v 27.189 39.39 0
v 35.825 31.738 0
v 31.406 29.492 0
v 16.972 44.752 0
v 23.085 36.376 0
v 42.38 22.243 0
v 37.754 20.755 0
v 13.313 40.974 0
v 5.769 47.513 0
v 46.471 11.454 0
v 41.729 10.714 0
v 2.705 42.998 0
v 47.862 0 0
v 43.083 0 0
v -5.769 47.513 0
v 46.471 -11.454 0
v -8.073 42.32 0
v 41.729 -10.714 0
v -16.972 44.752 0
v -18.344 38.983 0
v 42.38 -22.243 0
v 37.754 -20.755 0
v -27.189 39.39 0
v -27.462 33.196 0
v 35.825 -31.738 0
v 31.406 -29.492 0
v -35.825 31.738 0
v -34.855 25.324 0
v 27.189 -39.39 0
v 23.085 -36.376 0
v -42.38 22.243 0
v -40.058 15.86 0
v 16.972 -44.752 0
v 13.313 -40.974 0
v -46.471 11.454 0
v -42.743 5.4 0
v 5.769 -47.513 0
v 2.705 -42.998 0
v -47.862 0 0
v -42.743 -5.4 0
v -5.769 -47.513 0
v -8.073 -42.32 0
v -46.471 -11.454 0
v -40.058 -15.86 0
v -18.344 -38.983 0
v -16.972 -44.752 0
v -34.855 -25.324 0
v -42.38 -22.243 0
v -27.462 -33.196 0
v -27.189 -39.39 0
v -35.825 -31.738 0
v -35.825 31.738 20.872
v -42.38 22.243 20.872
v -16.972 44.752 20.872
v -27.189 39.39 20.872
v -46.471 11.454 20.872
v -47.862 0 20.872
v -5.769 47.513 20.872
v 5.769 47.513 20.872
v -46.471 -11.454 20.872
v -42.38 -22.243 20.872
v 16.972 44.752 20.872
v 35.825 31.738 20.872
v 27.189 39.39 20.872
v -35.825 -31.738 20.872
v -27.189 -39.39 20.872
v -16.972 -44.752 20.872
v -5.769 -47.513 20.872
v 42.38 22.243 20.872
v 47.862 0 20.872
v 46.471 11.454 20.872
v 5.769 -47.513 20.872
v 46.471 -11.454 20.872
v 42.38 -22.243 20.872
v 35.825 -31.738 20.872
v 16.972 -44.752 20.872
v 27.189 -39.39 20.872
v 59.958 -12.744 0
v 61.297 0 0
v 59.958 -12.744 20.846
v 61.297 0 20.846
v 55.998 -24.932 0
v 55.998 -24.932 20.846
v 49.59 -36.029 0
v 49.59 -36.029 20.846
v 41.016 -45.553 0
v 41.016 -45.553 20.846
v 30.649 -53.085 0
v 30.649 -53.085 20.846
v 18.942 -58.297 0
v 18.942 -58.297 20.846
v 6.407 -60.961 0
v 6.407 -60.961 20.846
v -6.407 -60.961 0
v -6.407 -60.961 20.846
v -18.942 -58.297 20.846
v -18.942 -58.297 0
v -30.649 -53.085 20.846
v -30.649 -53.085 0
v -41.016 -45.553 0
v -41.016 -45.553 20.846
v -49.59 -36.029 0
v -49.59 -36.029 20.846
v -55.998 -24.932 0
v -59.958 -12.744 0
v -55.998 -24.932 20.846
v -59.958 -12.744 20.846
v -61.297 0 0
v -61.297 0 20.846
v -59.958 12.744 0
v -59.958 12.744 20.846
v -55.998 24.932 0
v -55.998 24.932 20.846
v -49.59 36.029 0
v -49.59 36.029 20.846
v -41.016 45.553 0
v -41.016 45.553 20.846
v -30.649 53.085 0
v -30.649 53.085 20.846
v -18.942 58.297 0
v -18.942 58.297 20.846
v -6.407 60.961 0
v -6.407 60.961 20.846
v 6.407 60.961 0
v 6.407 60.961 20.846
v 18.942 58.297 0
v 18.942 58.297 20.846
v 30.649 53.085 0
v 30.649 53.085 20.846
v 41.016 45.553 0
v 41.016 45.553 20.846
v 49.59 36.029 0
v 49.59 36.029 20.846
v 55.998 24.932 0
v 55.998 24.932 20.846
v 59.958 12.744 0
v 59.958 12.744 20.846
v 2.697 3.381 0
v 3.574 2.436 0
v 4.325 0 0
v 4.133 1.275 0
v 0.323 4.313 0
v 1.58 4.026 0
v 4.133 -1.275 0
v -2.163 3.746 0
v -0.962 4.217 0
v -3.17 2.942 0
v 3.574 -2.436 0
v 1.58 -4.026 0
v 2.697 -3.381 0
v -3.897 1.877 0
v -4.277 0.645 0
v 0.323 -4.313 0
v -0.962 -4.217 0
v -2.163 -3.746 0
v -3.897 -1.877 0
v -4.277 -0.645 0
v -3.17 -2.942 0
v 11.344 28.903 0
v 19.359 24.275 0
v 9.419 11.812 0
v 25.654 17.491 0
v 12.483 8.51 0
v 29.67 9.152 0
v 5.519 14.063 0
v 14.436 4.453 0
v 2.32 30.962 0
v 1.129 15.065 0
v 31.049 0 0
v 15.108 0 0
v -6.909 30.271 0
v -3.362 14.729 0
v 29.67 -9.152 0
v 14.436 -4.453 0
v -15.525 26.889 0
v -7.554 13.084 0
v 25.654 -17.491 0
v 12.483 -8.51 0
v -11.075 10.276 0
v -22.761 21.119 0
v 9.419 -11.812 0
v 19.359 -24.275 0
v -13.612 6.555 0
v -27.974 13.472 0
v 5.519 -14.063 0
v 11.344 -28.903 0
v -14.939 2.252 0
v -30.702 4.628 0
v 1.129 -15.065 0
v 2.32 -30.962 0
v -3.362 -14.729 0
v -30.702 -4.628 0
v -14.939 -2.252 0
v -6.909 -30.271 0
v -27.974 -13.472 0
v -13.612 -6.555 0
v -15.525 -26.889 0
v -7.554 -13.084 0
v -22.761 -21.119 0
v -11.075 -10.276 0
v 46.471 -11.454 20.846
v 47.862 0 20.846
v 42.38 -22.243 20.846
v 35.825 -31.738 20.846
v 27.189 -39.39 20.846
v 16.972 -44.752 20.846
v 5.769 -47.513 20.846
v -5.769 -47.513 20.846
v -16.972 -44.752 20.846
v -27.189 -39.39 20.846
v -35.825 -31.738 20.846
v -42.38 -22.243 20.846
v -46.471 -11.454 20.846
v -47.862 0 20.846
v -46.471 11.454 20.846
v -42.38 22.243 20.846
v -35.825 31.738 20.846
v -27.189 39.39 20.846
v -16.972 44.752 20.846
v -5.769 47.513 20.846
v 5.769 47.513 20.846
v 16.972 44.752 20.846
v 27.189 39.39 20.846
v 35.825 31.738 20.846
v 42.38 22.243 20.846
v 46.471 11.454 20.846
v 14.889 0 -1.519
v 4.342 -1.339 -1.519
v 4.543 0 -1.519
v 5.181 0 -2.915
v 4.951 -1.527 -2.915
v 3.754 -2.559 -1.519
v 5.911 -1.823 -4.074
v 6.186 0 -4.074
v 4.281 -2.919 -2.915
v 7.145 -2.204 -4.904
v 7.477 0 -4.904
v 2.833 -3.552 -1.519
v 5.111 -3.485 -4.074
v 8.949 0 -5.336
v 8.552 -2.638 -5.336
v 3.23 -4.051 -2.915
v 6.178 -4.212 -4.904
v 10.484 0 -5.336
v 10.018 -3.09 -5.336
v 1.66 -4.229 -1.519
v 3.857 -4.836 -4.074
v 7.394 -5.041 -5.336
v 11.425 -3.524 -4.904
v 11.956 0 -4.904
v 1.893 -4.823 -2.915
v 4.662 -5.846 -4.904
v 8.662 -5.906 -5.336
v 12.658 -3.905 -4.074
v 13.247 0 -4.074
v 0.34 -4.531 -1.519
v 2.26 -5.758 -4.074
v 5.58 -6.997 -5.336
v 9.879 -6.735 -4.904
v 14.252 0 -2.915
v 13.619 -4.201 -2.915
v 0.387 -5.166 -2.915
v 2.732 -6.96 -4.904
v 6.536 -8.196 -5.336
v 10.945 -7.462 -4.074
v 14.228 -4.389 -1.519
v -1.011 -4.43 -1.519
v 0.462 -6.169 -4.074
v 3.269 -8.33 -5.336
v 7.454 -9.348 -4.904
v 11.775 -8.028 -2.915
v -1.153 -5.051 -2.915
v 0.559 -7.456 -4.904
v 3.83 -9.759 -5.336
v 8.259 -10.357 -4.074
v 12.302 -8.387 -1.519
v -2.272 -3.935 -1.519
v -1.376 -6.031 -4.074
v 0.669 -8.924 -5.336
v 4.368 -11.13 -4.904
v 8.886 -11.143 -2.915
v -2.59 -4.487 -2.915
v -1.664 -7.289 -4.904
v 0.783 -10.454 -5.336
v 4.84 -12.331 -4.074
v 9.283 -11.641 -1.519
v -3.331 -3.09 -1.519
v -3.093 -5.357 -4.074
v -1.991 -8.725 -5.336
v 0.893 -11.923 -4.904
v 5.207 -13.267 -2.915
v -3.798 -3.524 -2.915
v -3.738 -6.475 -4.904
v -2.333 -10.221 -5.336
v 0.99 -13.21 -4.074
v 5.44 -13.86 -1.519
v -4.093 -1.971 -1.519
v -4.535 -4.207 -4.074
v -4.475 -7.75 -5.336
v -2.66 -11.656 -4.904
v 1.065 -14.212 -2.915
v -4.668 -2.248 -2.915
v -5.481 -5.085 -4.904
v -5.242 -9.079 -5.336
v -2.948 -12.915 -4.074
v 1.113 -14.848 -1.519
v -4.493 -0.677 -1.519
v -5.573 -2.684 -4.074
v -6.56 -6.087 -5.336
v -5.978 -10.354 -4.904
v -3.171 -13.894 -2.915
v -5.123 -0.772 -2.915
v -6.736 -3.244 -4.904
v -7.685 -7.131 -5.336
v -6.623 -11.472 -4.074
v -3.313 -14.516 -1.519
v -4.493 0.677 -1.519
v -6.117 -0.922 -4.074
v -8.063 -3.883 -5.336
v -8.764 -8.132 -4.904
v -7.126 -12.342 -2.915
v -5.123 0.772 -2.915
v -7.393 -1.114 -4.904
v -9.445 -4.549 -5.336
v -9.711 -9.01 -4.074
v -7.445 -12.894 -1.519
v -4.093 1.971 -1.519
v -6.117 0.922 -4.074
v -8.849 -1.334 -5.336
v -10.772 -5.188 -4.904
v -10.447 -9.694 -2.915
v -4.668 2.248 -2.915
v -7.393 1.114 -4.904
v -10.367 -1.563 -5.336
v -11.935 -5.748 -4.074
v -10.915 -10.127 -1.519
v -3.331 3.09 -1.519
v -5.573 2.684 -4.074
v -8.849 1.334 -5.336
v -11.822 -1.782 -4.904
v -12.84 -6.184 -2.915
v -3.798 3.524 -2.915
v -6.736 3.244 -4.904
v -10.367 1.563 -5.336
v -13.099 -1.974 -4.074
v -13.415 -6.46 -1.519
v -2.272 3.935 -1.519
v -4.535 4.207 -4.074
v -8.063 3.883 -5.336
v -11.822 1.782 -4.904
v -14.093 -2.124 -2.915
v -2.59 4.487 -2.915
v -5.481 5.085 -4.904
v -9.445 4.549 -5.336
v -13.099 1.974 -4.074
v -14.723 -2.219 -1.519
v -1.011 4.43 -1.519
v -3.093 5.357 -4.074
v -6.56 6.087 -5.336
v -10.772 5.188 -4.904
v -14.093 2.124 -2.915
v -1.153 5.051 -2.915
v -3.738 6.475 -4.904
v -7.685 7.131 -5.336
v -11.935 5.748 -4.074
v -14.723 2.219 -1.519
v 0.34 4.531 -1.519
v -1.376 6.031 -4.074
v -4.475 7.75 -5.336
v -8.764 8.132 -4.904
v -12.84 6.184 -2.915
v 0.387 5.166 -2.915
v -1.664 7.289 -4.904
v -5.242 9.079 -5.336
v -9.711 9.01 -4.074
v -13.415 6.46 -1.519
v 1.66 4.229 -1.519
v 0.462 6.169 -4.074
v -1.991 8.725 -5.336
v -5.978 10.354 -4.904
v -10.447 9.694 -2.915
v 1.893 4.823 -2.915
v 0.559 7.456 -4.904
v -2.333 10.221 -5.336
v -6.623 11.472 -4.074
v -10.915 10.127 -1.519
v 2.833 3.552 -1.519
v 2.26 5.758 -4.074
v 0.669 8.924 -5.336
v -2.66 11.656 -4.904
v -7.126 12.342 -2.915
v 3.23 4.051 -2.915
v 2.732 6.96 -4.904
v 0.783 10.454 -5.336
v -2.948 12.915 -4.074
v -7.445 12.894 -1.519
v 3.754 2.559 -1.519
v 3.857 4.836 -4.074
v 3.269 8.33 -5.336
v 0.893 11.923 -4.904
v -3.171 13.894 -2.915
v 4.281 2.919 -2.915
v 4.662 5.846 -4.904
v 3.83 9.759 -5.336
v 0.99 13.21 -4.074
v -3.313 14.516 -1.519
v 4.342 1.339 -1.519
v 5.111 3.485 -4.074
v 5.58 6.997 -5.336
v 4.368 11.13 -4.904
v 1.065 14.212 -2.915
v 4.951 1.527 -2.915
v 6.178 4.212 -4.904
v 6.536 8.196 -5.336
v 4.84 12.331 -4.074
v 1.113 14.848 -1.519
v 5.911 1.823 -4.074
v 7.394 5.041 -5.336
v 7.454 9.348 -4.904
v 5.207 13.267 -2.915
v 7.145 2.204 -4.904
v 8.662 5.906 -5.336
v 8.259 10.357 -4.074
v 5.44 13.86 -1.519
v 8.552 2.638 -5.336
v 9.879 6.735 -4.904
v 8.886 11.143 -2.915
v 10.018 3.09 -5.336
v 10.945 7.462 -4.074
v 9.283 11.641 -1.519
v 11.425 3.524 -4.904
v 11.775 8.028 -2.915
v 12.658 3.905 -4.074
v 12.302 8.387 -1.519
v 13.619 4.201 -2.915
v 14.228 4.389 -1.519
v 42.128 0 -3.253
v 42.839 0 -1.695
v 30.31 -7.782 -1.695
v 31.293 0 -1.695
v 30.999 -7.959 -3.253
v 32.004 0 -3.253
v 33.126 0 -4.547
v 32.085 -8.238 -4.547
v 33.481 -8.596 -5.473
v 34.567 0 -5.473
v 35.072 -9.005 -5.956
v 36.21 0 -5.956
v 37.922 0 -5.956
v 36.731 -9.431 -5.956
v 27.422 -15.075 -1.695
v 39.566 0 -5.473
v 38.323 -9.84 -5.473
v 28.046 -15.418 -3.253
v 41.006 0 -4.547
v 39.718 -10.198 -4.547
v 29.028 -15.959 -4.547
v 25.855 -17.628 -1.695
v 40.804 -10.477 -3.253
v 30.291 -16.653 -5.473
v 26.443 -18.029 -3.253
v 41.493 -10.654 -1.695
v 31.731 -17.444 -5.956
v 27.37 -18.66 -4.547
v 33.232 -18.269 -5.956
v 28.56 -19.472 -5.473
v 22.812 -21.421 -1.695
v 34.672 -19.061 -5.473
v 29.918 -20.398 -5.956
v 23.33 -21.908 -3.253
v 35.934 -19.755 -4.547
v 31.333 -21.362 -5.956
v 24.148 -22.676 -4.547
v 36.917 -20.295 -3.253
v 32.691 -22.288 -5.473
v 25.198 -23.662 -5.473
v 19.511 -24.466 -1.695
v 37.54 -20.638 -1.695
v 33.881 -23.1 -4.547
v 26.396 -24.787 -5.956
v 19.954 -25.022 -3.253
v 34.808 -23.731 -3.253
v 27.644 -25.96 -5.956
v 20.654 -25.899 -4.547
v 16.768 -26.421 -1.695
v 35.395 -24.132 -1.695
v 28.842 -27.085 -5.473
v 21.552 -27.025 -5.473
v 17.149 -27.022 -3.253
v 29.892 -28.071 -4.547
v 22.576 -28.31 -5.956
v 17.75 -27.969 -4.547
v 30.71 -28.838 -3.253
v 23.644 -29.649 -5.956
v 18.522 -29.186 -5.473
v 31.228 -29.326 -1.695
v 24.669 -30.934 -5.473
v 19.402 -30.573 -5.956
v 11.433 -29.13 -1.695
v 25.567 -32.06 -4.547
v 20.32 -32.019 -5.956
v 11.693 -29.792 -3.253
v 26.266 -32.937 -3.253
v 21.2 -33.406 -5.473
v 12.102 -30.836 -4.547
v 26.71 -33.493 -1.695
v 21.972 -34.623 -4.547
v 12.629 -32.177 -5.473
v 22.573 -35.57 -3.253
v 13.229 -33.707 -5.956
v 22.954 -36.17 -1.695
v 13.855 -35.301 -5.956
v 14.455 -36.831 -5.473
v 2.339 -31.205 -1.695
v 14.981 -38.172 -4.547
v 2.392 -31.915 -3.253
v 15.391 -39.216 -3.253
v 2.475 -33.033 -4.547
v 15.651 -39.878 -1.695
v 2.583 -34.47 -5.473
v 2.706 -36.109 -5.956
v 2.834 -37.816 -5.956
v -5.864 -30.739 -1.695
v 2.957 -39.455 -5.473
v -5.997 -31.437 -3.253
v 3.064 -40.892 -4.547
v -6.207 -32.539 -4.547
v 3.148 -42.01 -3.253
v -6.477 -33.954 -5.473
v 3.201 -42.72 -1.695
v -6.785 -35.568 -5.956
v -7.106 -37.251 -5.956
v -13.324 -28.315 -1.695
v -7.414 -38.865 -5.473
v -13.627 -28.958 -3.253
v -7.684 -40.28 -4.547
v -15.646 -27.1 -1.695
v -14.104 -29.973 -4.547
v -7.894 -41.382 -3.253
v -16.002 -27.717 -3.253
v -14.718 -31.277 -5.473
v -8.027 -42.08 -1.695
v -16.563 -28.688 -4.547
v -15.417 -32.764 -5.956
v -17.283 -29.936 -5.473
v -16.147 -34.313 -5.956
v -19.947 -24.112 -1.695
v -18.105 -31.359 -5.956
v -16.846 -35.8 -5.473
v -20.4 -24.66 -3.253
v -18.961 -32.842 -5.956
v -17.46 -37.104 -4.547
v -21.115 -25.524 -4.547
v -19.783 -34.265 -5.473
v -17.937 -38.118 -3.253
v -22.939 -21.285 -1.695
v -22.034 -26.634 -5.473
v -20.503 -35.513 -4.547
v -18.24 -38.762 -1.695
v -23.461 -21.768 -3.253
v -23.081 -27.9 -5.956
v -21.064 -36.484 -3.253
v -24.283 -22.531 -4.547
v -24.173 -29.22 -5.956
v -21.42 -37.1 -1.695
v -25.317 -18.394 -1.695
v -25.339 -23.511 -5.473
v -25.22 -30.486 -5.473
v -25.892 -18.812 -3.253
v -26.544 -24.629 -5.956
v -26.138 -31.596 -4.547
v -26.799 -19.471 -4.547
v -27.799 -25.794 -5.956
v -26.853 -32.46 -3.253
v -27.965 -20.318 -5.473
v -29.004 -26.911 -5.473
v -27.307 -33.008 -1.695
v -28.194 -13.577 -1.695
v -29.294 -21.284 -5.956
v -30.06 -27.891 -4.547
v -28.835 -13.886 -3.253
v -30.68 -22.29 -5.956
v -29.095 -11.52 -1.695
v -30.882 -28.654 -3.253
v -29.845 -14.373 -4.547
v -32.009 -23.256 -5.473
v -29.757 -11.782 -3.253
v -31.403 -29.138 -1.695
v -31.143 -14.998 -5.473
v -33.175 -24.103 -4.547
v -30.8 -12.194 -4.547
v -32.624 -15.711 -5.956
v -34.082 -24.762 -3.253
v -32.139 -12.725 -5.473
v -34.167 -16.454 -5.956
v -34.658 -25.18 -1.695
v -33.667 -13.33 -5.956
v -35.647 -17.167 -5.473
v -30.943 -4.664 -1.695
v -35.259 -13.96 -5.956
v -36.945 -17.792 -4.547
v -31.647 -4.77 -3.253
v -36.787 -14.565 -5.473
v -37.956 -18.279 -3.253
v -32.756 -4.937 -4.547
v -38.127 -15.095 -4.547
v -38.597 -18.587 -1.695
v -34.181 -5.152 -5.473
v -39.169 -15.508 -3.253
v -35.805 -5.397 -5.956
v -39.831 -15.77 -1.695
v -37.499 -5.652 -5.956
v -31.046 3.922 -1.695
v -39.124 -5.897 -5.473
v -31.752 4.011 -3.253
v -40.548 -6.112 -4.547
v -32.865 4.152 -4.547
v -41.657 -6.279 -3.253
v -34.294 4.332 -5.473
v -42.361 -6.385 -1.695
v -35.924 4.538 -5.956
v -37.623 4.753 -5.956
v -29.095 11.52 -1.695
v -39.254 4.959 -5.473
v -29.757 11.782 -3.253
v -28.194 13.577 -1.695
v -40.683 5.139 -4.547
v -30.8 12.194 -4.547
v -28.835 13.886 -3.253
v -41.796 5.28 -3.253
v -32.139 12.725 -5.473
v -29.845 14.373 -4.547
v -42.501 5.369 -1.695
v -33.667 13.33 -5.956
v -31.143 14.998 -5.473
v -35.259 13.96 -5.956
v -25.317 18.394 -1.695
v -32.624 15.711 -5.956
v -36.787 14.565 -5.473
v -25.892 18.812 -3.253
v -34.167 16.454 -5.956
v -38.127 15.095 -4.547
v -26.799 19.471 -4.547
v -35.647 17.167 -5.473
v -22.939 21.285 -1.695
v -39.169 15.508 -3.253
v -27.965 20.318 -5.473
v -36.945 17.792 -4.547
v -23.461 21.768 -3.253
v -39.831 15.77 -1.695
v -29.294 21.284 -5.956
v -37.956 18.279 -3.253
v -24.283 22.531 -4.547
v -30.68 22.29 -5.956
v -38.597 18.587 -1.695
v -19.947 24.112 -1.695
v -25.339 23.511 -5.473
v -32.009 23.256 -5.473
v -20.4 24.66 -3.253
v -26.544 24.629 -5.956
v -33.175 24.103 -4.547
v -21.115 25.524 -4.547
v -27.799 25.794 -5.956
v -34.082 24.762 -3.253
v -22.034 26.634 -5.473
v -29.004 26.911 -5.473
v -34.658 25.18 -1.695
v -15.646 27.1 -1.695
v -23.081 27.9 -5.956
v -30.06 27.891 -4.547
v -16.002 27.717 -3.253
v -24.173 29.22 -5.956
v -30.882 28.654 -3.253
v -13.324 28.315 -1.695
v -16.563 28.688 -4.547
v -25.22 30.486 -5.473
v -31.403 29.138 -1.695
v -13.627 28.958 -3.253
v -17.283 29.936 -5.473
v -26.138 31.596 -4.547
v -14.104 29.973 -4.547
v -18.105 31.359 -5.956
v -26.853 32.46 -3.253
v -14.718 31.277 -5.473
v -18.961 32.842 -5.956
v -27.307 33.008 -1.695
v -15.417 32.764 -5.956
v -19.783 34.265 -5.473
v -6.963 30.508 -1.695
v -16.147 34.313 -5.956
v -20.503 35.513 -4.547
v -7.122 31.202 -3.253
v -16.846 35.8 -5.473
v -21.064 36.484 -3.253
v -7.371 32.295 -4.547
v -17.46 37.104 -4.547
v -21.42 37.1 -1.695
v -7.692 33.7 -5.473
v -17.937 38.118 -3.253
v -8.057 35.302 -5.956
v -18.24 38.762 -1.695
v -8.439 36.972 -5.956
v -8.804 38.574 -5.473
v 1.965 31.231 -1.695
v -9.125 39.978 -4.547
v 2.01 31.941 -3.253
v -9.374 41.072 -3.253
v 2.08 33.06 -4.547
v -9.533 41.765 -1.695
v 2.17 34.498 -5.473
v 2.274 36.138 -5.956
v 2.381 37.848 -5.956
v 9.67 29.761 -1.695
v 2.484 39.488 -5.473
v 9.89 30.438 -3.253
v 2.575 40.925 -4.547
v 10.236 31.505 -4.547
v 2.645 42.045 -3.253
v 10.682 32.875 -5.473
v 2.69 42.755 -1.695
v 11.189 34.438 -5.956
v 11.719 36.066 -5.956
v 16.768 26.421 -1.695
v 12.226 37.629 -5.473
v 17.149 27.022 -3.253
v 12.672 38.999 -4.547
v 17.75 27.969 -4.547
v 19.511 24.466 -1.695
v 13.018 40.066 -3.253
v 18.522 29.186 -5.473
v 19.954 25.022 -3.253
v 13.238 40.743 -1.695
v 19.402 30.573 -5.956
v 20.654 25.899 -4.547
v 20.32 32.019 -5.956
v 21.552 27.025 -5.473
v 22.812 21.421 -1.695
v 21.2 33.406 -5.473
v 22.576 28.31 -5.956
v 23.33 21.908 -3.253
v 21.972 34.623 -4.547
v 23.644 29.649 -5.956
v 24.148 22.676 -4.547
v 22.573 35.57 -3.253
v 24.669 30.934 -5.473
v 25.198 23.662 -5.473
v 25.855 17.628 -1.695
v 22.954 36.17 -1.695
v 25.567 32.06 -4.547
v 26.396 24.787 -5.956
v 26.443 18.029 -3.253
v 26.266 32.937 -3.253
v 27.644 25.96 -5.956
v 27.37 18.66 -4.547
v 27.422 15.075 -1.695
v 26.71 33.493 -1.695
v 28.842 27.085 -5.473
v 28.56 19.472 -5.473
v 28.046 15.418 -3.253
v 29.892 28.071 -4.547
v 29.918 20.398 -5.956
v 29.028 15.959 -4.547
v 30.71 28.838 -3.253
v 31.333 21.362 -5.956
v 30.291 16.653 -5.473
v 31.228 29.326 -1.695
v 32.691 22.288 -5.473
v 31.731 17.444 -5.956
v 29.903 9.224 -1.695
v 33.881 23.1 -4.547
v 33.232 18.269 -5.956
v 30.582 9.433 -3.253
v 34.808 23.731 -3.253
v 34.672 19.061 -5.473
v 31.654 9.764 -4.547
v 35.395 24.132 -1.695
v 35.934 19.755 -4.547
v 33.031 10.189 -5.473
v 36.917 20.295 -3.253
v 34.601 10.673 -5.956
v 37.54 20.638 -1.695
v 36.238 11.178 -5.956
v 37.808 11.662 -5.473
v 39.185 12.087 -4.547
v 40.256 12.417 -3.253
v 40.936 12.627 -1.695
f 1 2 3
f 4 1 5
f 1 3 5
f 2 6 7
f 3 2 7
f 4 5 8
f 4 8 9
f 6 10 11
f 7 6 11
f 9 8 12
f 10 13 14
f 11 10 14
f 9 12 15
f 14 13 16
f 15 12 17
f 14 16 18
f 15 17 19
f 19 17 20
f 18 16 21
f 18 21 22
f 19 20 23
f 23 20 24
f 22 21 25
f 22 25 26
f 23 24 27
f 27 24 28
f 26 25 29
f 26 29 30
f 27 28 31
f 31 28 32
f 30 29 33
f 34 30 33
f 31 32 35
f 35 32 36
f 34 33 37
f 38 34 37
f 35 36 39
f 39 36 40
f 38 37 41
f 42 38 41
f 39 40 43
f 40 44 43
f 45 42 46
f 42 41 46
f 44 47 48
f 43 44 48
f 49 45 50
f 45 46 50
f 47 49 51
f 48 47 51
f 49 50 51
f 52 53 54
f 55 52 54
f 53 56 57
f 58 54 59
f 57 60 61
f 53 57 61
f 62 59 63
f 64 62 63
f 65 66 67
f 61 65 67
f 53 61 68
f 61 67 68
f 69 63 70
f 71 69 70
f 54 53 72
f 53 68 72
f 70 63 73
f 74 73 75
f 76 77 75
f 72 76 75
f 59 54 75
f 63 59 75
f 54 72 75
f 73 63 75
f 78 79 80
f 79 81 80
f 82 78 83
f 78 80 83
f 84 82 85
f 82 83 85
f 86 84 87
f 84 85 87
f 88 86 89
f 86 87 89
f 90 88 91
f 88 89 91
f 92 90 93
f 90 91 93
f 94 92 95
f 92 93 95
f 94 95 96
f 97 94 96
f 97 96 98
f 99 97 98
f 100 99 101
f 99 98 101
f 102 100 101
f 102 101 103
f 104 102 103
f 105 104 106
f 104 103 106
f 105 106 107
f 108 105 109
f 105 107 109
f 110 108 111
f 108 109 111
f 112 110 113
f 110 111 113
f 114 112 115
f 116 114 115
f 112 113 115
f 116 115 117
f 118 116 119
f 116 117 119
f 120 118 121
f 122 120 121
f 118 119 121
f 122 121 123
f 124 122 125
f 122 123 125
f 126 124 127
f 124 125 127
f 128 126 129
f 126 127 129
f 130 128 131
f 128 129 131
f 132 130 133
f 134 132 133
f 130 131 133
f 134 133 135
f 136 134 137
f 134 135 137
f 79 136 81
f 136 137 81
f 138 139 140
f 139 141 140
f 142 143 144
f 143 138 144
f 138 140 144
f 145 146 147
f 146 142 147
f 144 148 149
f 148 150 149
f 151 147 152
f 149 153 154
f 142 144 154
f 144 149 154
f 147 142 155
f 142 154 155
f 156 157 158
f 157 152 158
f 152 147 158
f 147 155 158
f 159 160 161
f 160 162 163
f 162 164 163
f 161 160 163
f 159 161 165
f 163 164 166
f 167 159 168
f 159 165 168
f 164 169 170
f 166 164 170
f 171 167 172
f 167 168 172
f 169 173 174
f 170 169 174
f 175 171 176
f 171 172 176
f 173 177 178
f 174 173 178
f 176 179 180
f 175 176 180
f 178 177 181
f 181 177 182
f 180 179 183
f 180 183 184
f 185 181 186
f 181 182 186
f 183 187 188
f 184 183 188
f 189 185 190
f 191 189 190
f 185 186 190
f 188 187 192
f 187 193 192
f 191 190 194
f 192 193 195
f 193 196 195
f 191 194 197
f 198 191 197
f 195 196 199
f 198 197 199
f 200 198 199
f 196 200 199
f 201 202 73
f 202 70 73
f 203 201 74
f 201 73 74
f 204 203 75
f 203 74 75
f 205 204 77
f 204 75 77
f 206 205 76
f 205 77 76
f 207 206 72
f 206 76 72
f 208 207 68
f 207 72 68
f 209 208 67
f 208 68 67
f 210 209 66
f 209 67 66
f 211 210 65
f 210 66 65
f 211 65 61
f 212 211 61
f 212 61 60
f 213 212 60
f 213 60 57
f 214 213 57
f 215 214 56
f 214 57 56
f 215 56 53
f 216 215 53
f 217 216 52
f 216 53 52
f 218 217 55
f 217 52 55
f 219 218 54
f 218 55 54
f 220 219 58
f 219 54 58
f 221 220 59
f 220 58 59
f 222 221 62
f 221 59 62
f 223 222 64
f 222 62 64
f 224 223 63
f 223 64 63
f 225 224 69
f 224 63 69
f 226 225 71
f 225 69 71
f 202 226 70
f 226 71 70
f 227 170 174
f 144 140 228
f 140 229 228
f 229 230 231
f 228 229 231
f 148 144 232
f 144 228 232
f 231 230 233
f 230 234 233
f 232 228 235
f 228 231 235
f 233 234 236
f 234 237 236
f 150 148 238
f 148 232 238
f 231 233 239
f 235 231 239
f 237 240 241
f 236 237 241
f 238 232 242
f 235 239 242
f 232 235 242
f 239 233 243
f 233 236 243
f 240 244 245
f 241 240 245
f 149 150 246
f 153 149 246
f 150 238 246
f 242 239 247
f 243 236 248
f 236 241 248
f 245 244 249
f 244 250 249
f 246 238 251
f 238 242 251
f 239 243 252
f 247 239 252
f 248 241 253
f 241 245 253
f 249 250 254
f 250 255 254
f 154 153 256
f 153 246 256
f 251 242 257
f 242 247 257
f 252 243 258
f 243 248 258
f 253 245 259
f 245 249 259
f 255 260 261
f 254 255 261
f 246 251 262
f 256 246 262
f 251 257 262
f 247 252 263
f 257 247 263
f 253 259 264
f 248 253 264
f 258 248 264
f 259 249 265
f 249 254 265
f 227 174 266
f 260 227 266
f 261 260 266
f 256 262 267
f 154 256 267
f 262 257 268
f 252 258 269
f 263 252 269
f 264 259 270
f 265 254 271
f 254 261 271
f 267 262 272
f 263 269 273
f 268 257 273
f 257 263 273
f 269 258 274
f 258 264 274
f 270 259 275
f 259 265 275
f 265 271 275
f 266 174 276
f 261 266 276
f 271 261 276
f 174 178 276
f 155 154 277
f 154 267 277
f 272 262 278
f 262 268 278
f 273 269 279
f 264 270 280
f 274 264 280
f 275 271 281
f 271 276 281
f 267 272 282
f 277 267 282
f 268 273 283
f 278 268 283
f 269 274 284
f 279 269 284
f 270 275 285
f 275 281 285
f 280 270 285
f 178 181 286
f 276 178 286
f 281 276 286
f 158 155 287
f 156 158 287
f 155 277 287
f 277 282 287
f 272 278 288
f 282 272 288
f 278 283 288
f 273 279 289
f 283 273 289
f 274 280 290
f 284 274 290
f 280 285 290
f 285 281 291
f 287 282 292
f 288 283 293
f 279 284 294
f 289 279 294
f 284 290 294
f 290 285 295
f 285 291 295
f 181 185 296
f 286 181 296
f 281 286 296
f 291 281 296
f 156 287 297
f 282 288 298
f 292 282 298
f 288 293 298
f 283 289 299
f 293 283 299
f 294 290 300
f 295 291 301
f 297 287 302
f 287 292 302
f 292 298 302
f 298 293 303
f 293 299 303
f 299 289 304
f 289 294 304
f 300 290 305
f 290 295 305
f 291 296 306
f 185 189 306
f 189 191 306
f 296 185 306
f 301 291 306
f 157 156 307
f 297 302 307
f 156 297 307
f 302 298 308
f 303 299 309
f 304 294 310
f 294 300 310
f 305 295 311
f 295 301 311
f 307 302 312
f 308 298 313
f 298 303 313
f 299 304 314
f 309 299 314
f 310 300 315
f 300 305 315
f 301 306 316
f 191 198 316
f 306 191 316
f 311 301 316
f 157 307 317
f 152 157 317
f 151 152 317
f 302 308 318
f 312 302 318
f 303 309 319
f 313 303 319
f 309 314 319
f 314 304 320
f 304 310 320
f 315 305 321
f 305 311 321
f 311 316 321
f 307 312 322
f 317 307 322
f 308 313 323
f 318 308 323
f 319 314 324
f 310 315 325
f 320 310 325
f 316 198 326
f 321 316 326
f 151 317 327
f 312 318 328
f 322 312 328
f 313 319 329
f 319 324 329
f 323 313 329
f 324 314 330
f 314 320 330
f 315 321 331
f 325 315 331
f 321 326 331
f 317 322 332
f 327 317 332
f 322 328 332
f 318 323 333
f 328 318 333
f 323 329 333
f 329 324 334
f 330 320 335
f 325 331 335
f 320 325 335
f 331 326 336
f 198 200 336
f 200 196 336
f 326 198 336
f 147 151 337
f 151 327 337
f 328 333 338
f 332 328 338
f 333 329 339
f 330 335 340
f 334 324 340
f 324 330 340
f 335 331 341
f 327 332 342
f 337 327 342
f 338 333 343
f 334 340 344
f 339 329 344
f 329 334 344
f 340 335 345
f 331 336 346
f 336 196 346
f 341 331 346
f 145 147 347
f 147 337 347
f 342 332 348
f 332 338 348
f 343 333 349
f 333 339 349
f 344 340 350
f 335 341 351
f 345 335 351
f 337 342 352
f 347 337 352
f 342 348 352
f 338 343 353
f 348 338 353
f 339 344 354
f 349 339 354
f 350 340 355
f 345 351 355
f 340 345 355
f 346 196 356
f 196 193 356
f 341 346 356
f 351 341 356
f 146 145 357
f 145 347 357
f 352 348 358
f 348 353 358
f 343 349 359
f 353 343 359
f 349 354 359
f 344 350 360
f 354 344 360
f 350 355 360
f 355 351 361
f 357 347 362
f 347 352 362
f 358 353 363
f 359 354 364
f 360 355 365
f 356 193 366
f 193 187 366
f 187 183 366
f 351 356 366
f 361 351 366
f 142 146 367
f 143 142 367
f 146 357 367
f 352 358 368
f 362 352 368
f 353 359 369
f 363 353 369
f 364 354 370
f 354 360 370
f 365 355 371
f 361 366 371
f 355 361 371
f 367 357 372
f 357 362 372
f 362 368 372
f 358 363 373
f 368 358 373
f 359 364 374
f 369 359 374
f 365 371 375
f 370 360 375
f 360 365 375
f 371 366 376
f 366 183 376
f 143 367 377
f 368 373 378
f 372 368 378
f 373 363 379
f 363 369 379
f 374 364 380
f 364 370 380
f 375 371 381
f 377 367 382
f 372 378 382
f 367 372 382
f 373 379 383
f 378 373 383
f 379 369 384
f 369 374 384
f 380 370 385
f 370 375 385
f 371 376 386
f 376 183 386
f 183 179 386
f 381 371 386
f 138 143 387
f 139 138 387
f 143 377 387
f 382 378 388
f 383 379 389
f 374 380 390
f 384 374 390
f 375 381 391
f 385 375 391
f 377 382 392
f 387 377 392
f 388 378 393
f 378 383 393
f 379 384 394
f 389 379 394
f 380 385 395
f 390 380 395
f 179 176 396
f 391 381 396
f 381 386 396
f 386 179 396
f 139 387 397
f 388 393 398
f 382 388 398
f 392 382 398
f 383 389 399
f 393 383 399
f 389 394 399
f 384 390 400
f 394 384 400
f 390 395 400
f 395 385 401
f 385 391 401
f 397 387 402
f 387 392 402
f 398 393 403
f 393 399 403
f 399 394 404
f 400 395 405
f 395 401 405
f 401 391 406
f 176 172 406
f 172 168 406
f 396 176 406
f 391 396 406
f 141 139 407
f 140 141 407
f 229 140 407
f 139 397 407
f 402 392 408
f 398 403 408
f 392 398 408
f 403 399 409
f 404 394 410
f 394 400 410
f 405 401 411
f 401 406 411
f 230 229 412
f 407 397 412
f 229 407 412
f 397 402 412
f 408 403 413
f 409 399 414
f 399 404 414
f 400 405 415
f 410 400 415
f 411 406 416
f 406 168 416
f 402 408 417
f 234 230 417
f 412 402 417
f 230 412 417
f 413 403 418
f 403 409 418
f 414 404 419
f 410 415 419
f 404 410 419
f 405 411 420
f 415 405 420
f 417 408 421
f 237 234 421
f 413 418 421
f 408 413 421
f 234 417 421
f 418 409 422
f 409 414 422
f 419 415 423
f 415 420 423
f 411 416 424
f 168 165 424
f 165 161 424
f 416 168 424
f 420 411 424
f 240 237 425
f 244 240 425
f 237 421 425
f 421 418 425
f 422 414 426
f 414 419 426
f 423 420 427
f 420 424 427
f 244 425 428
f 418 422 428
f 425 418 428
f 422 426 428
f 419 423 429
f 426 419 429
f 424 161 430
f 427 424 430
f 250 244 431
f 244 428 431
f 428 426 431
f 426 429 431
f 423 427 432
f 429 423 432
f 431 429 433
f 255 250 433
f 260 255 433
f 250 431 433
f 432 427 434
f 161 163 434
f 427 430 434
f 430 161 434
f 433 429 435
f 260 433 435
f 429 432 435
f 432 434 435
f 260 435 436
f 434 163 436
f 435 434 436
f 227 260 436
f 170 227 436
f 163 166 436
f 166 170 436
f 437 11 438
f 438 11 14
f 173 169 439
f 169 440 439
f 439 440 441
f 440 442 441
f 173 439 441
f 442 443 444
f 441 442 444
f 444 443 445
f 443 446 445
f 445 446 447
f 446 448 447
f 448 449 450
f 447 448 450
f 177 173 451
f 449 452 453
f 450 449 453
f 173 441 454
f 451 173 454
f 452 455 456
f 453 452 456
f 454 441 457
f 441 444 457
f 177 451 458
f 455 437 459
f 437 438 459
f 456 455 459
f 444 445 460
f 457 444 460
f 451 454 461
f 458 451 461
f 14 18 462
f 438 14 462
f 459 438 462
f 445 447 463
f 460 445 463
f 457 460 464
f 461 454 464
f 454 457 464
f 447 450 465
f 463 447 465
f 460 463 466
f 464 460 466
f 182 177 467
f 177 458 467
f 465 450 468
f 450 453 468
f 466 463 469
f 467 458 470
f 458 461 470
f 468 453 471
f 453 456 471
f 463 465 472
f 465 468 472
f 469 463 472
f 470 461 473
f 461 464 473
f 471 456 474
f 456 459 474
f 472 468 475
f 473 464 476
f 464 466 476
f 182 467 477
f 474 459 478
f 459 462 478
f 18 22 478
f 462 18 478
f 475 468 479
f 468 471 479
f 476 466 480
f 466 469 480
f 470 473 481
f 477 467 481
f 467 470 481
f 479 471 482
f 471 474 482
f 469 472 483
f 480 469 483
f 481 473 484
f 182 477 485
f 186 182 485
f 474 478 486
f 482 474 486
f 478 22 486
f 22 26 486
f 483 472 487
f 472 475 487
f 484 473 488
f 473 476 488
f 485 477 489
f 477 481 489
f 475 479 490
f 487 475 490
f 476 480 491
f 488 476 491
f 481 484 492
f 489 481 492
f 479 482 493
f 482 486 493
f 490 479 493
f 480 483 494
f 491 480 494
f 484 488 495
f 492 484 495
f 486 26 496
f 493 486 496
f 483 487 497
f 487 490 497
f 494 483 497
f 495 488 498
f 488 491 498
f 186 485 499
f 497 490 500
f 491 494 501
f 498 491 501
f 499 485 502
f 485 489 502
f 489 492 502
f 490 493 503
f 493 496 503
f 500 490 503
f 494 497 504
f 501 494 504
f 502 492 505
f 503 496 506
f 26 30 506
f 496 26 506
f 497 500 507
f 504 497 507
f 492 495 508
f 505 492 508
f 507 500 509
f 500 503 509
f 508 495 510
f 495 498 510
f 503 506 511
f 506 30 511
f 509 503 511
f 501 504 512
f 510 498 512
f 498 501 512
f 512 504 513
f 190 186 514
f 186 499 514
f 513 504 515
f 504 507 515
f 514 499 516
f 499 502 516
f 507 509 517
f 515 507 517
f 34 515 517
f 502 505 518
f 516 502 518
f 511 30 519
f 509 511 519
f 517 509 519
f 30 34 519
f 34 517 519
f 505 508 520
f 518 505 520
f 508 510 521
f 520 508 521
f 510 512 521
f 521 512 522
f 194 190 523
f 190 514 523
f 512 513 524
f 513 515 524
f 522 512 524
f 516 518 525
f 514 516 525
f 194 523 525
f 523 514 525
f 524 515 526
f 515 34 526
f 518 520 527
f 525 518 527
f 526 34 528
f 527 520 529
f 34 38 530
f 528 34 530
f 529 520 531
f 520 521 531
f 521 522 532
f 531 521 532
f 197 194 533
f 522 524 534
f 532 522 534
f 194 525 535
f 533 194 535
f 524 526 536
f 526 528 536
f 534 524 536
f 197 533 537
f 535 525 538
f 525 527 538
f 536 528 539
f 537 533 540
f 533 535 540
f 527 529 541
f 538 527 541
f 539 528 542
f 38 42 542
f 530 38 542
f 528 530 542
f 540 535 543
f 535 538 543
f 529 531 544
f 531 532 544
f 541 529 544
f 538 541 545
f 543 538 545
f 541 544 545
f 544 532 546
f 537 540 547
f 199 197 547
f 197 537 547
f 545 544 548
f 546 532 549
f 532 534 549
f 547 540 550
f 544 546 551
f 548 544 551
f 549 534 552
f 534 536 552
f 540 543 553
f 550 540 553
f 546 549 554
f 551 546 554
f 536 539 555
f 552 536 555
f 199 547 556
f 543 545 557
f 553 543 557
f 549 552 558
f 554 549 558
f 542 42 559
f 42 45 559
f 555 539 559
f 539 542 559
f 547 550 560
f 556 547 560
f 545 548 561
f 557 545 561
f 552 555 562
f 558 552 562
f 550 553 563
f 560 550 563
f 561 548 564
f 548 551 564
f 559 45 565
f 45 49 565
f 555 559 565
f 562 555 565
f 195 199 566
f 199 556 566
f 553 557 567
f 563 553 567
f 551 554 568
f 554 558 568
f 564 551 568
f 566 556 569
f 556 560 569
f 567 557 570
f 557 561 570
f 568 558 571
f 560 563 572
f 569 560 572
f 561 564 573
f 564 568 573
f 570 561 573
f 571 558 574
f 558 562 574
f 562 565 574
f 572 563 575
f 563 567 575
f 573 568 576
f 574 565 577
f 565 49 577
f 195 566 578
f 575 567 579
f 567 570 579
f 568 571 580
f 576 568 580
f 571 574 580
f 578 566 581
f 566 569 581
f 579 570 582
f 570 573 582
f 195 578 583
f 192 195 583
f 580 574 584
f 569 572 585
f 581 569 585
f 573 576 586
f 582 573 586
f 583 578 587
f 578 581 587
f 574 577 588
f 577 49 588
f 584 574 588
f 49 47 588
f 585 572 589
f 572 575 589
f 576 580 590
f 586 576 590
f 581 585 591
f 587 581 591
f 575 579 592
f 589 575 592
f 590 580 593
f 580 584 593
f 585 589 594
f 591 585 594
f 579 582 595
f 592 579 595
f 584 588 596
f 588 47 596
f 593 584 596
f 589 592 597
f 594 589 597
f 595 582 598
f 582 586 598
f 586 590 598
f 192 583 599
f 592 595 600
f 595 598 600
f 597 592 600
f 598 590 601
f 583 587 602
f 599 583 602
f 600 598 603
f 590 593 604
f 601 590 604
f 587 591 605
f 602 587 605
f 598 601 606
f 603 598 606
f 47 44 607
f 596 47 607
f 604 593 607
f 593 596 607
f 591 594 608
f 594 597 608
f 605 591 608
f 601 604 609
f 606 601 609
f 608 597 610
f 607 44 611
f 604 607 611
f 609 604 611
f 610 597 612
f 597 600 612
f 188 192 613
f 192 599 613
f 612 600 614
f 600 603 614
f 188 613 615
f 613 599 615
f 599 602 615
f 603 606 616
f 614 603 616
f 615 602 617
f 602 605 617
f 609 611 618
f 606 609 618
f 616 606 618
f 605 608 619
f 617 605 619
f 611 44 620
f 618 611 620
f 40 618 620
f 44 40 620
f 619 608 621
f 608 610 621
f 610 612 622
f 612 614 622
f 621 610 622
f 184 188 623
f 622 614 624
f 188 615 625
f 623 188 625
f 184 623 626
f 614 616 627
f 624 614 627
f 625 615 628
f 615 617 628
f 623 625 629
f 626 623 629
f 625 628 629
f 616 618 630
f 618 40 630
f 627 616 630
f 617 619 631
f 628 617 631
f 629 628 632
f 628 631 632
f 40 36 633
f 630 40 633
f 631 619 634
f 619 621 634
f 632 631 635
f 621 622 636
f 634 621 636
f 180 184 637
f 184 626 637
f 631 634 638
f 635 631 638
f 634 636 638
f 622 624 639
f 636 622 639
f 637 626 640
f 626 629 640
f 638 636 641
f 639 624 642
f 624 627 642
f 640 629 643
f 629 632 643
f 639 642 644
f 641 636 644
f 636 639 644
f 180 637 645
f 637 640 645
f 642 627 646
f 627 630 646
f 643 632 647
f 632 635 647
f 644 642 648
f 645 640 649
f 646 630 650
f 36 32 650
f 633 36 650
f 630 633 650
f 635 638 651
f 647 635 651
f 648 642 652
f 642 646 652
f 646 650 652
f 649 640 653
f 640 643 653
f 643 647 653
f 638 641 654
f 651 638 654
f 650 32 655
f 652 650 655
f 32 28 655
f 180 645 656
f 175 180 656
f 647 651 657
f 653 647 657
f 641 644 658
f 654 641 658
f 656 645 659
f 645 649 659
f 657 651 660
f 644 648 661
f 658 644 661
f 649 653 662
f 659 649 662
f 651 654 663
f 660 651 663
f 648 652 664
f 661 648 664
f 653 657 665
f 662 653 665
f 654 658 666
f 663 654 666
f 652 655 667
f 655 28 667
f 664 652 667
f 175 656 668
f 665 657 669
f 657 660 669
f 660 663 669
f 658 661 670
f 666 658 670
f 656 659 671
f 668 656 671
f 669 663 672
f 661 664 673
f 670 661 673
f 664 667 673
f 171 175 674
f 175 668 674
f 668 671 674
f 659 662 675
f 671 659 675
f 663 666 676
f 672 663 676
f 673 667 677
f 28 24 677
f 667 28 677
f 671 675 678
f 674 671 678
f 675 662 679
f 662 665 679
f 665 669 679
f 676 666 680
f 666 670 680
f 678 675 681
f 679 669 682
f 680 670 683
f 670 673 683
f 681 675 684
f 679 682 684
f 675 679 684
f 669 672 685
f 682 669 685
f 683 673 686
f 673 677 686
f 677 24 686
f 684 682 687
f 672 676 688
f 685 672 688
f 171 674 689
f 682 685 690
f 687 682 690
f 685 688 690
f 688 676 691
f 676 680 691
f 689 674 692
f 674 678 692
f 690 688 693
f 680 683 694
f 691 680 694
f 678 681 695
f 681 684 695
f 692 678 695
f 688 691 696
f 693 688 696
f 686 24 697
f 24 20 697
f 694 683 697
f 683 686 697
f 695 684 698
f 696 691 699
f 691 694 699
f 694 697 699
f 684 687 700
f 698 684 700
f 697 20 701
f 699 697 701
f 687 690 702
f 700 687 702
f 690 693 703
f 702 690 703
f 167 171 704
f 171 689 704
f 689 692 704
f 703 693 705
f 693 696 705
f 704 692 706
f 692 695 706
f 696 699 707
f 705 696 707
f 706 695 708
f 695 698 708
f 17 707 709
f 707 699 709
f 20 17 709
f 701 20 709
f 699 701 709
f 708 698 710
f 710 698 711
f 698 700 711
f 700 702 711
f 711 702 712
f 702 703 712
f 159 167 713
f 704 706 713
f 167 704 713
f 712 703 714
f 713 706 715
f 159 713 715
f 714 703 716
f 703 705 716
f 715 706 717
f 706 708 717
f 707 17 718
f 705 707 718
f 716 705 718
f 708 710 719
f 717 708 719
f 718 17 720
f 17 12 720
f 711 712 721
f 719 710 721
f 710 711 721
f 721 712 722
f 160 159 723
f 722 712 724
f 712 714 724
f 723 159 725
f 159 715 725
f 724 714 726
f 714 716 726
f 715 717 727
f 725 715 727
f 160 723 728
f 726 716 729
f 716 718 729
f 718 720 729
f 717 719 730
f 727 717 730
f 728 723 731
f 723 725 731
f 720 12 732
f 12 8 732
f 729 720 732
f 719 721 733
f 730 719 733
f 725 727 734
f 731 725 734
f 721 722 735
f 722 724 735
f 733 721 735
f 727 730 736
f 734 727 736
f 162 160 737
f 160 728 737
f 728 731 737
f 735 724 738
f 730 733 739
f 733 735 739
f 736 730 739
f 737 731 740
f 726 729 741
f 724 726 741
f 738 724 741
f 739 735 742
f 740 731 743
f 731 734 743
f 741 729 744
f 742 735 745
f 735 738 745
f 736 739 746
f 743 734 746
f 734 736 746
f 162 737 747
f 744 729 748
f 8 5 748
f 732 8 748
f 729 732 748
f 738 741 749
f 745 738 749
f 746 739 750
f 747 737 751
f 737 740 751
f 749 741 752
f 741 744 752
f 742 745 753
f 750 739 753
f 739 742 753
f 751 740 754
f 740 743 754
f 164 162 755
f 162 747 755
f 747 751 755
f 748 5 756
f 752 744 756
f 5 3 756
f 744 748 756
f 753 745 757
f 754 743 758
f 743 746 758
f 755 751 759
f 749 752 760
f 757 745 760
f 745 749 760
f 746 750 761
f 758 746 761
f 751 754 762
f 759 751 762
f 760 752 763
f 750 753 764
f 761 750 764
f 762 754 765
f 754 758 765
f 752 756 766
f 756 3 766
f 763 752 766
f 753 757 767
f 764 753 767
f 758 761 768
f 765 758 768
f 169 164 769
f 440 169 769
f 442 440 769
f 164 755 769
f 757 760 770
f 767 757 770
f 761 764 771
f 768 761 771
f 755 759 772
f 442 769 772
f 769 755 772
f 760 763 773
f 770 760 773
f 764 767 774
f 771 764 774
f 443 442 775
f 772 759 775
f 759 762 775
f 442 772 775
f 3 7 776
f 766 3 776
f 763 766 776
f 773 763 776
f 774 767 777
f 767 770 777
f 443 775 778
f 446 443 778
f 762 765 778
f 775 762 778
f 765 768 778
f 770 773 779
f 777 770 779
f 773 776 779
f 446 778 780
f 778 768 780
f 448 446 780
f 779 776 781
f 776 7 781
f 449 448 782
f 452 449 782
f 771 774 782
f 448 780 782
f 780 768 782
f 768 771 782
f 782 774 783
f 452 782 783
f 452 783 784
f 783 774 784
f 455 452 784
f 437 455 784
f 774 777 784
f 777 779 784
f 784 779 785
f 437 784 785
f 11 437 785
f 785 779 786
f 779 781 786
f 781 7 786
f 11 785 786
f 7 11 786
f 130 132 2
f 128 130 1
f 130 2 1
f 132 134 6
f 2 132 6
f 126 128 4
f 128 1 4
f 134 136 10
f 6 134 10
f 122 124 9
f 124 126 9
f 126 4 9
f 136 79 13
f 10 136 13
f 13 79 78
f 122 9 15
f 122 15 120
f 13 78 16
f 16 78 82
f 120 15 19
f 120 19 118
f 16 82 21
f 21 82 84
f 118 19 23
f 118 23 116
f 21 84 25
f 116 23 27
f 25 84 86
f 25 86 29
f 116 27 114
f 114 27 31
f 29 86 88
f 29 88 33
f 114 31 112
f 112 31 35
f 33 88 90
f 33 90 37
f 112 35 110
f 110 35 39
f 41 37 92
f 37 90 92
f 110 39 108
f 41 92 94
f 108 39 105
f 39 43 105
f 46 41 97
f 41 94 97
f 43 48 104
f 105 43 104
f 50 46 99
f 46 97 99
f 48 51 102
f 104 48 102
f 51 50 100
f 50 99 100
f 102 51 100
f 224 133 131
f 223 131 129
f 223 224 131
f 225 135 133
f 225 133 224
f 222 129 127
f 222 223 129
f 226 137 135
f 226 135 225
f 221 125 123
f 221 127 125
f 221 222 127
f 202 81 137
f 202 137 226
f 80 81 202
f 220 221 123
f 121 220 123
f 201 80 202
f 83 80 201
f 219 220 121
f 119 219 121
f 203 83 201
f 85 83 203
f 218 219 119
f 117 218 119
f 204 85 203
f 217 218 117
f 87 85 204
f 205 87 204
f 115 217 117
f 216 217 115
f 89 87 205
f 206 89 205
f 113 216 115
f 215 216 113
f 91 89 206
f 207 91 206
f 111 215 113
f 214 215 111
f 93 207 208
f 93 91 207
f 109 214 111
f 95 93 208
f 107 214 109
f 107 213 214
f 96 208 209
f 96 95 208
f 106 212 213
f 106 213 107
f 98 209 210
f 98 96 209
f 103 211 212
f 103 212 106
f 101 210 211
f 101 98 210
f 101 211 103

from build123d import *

# Parameters (mm, degrees)
F0_W = 13.434972614
F0_H = 20.8462406445


# Not quite as in the source:
# - ends of sketch curves that miss each other by under 0.0002 mm in the source are joined


with BuildPart() as f1:
    # F0 (on Front) → F1 (revolve)
    with BuildSketch(Plane.XZ):
        with BuildLine():
            ThreePointArc((31.0491894541, 4.37e-08), (37.0661020279, -6.0169125301), (43.0830146017, 4.37e-08))
            Line((43.0830146017, 4.37e-08), (31.0491894541, 4.37e-08))
        make_face()
        with Locations((54.5795354992, 10.4231199002)):
            Rectangle(F0_W, F0_H)
        with BuildLine():
            Line((31.0491894541, 4.37e-08), (43.0830146017, 4.37e-08))
            ThreePointArc((43.0830146017, 4.37e-08), (37.0661020279, 6.0169126175), (31.0491894541, 4.37e-08))
        make_face()
        with BuildLine():
            Line((47.8620491922, 20.8721738309), (0, 20.8721738309))
            Line((0, 20.8721738309), (0, 4.37e-08))
            Line((0, 4.37e-08), (4.3250534176, 4.37e-08))
            ThreePointArc((4.3250534176, 4.37e-08), (9.7163589671, 5.3913055932), (15.1076645166, 4.37e-08))
            Line((15.1076645166, 4.37e-08), (31.0491894541, 4.37e-08))
            ThreePointArc((31.0491894541, 4.37e-08), (37.0661020279, 6.0169126175), (43.0830146017, 4.37e-08))
            Line((43.0830146017, 4.37e-08), (47.8620491922, 4.37e-08))
            Line((47.8620491922, 4.37e-08), (47.8620491922, 20.8462402225))
            Line((47.8620491922, 20.8462402225), (47.8620491922, 20.8721738309))
        make_face()
        with BuildLine():
            ThreePointArc((15.1076645166, 4.37e-08), (9.7163589671, 5.3913055932), (4.3250534176, 4.37e-08))
            Line((4.3250534176, 4.37e-08), (15.1076645166, 4.37e-08))
        make_face()
        with BuildLine():
            Line((15.1076645166, 4.37e-08), (4.3250534176, 4.37e-08))
            ThreePointArc((4.3250534176, 4.37e-08), (9.7163589671, -5.3913055058), (15.1076645166, 4.37e-08))
        make_face()
    revolve(axis=Axis((0, 0, 10.4360869373), (0, 0, -1)))


solid = f1.part
